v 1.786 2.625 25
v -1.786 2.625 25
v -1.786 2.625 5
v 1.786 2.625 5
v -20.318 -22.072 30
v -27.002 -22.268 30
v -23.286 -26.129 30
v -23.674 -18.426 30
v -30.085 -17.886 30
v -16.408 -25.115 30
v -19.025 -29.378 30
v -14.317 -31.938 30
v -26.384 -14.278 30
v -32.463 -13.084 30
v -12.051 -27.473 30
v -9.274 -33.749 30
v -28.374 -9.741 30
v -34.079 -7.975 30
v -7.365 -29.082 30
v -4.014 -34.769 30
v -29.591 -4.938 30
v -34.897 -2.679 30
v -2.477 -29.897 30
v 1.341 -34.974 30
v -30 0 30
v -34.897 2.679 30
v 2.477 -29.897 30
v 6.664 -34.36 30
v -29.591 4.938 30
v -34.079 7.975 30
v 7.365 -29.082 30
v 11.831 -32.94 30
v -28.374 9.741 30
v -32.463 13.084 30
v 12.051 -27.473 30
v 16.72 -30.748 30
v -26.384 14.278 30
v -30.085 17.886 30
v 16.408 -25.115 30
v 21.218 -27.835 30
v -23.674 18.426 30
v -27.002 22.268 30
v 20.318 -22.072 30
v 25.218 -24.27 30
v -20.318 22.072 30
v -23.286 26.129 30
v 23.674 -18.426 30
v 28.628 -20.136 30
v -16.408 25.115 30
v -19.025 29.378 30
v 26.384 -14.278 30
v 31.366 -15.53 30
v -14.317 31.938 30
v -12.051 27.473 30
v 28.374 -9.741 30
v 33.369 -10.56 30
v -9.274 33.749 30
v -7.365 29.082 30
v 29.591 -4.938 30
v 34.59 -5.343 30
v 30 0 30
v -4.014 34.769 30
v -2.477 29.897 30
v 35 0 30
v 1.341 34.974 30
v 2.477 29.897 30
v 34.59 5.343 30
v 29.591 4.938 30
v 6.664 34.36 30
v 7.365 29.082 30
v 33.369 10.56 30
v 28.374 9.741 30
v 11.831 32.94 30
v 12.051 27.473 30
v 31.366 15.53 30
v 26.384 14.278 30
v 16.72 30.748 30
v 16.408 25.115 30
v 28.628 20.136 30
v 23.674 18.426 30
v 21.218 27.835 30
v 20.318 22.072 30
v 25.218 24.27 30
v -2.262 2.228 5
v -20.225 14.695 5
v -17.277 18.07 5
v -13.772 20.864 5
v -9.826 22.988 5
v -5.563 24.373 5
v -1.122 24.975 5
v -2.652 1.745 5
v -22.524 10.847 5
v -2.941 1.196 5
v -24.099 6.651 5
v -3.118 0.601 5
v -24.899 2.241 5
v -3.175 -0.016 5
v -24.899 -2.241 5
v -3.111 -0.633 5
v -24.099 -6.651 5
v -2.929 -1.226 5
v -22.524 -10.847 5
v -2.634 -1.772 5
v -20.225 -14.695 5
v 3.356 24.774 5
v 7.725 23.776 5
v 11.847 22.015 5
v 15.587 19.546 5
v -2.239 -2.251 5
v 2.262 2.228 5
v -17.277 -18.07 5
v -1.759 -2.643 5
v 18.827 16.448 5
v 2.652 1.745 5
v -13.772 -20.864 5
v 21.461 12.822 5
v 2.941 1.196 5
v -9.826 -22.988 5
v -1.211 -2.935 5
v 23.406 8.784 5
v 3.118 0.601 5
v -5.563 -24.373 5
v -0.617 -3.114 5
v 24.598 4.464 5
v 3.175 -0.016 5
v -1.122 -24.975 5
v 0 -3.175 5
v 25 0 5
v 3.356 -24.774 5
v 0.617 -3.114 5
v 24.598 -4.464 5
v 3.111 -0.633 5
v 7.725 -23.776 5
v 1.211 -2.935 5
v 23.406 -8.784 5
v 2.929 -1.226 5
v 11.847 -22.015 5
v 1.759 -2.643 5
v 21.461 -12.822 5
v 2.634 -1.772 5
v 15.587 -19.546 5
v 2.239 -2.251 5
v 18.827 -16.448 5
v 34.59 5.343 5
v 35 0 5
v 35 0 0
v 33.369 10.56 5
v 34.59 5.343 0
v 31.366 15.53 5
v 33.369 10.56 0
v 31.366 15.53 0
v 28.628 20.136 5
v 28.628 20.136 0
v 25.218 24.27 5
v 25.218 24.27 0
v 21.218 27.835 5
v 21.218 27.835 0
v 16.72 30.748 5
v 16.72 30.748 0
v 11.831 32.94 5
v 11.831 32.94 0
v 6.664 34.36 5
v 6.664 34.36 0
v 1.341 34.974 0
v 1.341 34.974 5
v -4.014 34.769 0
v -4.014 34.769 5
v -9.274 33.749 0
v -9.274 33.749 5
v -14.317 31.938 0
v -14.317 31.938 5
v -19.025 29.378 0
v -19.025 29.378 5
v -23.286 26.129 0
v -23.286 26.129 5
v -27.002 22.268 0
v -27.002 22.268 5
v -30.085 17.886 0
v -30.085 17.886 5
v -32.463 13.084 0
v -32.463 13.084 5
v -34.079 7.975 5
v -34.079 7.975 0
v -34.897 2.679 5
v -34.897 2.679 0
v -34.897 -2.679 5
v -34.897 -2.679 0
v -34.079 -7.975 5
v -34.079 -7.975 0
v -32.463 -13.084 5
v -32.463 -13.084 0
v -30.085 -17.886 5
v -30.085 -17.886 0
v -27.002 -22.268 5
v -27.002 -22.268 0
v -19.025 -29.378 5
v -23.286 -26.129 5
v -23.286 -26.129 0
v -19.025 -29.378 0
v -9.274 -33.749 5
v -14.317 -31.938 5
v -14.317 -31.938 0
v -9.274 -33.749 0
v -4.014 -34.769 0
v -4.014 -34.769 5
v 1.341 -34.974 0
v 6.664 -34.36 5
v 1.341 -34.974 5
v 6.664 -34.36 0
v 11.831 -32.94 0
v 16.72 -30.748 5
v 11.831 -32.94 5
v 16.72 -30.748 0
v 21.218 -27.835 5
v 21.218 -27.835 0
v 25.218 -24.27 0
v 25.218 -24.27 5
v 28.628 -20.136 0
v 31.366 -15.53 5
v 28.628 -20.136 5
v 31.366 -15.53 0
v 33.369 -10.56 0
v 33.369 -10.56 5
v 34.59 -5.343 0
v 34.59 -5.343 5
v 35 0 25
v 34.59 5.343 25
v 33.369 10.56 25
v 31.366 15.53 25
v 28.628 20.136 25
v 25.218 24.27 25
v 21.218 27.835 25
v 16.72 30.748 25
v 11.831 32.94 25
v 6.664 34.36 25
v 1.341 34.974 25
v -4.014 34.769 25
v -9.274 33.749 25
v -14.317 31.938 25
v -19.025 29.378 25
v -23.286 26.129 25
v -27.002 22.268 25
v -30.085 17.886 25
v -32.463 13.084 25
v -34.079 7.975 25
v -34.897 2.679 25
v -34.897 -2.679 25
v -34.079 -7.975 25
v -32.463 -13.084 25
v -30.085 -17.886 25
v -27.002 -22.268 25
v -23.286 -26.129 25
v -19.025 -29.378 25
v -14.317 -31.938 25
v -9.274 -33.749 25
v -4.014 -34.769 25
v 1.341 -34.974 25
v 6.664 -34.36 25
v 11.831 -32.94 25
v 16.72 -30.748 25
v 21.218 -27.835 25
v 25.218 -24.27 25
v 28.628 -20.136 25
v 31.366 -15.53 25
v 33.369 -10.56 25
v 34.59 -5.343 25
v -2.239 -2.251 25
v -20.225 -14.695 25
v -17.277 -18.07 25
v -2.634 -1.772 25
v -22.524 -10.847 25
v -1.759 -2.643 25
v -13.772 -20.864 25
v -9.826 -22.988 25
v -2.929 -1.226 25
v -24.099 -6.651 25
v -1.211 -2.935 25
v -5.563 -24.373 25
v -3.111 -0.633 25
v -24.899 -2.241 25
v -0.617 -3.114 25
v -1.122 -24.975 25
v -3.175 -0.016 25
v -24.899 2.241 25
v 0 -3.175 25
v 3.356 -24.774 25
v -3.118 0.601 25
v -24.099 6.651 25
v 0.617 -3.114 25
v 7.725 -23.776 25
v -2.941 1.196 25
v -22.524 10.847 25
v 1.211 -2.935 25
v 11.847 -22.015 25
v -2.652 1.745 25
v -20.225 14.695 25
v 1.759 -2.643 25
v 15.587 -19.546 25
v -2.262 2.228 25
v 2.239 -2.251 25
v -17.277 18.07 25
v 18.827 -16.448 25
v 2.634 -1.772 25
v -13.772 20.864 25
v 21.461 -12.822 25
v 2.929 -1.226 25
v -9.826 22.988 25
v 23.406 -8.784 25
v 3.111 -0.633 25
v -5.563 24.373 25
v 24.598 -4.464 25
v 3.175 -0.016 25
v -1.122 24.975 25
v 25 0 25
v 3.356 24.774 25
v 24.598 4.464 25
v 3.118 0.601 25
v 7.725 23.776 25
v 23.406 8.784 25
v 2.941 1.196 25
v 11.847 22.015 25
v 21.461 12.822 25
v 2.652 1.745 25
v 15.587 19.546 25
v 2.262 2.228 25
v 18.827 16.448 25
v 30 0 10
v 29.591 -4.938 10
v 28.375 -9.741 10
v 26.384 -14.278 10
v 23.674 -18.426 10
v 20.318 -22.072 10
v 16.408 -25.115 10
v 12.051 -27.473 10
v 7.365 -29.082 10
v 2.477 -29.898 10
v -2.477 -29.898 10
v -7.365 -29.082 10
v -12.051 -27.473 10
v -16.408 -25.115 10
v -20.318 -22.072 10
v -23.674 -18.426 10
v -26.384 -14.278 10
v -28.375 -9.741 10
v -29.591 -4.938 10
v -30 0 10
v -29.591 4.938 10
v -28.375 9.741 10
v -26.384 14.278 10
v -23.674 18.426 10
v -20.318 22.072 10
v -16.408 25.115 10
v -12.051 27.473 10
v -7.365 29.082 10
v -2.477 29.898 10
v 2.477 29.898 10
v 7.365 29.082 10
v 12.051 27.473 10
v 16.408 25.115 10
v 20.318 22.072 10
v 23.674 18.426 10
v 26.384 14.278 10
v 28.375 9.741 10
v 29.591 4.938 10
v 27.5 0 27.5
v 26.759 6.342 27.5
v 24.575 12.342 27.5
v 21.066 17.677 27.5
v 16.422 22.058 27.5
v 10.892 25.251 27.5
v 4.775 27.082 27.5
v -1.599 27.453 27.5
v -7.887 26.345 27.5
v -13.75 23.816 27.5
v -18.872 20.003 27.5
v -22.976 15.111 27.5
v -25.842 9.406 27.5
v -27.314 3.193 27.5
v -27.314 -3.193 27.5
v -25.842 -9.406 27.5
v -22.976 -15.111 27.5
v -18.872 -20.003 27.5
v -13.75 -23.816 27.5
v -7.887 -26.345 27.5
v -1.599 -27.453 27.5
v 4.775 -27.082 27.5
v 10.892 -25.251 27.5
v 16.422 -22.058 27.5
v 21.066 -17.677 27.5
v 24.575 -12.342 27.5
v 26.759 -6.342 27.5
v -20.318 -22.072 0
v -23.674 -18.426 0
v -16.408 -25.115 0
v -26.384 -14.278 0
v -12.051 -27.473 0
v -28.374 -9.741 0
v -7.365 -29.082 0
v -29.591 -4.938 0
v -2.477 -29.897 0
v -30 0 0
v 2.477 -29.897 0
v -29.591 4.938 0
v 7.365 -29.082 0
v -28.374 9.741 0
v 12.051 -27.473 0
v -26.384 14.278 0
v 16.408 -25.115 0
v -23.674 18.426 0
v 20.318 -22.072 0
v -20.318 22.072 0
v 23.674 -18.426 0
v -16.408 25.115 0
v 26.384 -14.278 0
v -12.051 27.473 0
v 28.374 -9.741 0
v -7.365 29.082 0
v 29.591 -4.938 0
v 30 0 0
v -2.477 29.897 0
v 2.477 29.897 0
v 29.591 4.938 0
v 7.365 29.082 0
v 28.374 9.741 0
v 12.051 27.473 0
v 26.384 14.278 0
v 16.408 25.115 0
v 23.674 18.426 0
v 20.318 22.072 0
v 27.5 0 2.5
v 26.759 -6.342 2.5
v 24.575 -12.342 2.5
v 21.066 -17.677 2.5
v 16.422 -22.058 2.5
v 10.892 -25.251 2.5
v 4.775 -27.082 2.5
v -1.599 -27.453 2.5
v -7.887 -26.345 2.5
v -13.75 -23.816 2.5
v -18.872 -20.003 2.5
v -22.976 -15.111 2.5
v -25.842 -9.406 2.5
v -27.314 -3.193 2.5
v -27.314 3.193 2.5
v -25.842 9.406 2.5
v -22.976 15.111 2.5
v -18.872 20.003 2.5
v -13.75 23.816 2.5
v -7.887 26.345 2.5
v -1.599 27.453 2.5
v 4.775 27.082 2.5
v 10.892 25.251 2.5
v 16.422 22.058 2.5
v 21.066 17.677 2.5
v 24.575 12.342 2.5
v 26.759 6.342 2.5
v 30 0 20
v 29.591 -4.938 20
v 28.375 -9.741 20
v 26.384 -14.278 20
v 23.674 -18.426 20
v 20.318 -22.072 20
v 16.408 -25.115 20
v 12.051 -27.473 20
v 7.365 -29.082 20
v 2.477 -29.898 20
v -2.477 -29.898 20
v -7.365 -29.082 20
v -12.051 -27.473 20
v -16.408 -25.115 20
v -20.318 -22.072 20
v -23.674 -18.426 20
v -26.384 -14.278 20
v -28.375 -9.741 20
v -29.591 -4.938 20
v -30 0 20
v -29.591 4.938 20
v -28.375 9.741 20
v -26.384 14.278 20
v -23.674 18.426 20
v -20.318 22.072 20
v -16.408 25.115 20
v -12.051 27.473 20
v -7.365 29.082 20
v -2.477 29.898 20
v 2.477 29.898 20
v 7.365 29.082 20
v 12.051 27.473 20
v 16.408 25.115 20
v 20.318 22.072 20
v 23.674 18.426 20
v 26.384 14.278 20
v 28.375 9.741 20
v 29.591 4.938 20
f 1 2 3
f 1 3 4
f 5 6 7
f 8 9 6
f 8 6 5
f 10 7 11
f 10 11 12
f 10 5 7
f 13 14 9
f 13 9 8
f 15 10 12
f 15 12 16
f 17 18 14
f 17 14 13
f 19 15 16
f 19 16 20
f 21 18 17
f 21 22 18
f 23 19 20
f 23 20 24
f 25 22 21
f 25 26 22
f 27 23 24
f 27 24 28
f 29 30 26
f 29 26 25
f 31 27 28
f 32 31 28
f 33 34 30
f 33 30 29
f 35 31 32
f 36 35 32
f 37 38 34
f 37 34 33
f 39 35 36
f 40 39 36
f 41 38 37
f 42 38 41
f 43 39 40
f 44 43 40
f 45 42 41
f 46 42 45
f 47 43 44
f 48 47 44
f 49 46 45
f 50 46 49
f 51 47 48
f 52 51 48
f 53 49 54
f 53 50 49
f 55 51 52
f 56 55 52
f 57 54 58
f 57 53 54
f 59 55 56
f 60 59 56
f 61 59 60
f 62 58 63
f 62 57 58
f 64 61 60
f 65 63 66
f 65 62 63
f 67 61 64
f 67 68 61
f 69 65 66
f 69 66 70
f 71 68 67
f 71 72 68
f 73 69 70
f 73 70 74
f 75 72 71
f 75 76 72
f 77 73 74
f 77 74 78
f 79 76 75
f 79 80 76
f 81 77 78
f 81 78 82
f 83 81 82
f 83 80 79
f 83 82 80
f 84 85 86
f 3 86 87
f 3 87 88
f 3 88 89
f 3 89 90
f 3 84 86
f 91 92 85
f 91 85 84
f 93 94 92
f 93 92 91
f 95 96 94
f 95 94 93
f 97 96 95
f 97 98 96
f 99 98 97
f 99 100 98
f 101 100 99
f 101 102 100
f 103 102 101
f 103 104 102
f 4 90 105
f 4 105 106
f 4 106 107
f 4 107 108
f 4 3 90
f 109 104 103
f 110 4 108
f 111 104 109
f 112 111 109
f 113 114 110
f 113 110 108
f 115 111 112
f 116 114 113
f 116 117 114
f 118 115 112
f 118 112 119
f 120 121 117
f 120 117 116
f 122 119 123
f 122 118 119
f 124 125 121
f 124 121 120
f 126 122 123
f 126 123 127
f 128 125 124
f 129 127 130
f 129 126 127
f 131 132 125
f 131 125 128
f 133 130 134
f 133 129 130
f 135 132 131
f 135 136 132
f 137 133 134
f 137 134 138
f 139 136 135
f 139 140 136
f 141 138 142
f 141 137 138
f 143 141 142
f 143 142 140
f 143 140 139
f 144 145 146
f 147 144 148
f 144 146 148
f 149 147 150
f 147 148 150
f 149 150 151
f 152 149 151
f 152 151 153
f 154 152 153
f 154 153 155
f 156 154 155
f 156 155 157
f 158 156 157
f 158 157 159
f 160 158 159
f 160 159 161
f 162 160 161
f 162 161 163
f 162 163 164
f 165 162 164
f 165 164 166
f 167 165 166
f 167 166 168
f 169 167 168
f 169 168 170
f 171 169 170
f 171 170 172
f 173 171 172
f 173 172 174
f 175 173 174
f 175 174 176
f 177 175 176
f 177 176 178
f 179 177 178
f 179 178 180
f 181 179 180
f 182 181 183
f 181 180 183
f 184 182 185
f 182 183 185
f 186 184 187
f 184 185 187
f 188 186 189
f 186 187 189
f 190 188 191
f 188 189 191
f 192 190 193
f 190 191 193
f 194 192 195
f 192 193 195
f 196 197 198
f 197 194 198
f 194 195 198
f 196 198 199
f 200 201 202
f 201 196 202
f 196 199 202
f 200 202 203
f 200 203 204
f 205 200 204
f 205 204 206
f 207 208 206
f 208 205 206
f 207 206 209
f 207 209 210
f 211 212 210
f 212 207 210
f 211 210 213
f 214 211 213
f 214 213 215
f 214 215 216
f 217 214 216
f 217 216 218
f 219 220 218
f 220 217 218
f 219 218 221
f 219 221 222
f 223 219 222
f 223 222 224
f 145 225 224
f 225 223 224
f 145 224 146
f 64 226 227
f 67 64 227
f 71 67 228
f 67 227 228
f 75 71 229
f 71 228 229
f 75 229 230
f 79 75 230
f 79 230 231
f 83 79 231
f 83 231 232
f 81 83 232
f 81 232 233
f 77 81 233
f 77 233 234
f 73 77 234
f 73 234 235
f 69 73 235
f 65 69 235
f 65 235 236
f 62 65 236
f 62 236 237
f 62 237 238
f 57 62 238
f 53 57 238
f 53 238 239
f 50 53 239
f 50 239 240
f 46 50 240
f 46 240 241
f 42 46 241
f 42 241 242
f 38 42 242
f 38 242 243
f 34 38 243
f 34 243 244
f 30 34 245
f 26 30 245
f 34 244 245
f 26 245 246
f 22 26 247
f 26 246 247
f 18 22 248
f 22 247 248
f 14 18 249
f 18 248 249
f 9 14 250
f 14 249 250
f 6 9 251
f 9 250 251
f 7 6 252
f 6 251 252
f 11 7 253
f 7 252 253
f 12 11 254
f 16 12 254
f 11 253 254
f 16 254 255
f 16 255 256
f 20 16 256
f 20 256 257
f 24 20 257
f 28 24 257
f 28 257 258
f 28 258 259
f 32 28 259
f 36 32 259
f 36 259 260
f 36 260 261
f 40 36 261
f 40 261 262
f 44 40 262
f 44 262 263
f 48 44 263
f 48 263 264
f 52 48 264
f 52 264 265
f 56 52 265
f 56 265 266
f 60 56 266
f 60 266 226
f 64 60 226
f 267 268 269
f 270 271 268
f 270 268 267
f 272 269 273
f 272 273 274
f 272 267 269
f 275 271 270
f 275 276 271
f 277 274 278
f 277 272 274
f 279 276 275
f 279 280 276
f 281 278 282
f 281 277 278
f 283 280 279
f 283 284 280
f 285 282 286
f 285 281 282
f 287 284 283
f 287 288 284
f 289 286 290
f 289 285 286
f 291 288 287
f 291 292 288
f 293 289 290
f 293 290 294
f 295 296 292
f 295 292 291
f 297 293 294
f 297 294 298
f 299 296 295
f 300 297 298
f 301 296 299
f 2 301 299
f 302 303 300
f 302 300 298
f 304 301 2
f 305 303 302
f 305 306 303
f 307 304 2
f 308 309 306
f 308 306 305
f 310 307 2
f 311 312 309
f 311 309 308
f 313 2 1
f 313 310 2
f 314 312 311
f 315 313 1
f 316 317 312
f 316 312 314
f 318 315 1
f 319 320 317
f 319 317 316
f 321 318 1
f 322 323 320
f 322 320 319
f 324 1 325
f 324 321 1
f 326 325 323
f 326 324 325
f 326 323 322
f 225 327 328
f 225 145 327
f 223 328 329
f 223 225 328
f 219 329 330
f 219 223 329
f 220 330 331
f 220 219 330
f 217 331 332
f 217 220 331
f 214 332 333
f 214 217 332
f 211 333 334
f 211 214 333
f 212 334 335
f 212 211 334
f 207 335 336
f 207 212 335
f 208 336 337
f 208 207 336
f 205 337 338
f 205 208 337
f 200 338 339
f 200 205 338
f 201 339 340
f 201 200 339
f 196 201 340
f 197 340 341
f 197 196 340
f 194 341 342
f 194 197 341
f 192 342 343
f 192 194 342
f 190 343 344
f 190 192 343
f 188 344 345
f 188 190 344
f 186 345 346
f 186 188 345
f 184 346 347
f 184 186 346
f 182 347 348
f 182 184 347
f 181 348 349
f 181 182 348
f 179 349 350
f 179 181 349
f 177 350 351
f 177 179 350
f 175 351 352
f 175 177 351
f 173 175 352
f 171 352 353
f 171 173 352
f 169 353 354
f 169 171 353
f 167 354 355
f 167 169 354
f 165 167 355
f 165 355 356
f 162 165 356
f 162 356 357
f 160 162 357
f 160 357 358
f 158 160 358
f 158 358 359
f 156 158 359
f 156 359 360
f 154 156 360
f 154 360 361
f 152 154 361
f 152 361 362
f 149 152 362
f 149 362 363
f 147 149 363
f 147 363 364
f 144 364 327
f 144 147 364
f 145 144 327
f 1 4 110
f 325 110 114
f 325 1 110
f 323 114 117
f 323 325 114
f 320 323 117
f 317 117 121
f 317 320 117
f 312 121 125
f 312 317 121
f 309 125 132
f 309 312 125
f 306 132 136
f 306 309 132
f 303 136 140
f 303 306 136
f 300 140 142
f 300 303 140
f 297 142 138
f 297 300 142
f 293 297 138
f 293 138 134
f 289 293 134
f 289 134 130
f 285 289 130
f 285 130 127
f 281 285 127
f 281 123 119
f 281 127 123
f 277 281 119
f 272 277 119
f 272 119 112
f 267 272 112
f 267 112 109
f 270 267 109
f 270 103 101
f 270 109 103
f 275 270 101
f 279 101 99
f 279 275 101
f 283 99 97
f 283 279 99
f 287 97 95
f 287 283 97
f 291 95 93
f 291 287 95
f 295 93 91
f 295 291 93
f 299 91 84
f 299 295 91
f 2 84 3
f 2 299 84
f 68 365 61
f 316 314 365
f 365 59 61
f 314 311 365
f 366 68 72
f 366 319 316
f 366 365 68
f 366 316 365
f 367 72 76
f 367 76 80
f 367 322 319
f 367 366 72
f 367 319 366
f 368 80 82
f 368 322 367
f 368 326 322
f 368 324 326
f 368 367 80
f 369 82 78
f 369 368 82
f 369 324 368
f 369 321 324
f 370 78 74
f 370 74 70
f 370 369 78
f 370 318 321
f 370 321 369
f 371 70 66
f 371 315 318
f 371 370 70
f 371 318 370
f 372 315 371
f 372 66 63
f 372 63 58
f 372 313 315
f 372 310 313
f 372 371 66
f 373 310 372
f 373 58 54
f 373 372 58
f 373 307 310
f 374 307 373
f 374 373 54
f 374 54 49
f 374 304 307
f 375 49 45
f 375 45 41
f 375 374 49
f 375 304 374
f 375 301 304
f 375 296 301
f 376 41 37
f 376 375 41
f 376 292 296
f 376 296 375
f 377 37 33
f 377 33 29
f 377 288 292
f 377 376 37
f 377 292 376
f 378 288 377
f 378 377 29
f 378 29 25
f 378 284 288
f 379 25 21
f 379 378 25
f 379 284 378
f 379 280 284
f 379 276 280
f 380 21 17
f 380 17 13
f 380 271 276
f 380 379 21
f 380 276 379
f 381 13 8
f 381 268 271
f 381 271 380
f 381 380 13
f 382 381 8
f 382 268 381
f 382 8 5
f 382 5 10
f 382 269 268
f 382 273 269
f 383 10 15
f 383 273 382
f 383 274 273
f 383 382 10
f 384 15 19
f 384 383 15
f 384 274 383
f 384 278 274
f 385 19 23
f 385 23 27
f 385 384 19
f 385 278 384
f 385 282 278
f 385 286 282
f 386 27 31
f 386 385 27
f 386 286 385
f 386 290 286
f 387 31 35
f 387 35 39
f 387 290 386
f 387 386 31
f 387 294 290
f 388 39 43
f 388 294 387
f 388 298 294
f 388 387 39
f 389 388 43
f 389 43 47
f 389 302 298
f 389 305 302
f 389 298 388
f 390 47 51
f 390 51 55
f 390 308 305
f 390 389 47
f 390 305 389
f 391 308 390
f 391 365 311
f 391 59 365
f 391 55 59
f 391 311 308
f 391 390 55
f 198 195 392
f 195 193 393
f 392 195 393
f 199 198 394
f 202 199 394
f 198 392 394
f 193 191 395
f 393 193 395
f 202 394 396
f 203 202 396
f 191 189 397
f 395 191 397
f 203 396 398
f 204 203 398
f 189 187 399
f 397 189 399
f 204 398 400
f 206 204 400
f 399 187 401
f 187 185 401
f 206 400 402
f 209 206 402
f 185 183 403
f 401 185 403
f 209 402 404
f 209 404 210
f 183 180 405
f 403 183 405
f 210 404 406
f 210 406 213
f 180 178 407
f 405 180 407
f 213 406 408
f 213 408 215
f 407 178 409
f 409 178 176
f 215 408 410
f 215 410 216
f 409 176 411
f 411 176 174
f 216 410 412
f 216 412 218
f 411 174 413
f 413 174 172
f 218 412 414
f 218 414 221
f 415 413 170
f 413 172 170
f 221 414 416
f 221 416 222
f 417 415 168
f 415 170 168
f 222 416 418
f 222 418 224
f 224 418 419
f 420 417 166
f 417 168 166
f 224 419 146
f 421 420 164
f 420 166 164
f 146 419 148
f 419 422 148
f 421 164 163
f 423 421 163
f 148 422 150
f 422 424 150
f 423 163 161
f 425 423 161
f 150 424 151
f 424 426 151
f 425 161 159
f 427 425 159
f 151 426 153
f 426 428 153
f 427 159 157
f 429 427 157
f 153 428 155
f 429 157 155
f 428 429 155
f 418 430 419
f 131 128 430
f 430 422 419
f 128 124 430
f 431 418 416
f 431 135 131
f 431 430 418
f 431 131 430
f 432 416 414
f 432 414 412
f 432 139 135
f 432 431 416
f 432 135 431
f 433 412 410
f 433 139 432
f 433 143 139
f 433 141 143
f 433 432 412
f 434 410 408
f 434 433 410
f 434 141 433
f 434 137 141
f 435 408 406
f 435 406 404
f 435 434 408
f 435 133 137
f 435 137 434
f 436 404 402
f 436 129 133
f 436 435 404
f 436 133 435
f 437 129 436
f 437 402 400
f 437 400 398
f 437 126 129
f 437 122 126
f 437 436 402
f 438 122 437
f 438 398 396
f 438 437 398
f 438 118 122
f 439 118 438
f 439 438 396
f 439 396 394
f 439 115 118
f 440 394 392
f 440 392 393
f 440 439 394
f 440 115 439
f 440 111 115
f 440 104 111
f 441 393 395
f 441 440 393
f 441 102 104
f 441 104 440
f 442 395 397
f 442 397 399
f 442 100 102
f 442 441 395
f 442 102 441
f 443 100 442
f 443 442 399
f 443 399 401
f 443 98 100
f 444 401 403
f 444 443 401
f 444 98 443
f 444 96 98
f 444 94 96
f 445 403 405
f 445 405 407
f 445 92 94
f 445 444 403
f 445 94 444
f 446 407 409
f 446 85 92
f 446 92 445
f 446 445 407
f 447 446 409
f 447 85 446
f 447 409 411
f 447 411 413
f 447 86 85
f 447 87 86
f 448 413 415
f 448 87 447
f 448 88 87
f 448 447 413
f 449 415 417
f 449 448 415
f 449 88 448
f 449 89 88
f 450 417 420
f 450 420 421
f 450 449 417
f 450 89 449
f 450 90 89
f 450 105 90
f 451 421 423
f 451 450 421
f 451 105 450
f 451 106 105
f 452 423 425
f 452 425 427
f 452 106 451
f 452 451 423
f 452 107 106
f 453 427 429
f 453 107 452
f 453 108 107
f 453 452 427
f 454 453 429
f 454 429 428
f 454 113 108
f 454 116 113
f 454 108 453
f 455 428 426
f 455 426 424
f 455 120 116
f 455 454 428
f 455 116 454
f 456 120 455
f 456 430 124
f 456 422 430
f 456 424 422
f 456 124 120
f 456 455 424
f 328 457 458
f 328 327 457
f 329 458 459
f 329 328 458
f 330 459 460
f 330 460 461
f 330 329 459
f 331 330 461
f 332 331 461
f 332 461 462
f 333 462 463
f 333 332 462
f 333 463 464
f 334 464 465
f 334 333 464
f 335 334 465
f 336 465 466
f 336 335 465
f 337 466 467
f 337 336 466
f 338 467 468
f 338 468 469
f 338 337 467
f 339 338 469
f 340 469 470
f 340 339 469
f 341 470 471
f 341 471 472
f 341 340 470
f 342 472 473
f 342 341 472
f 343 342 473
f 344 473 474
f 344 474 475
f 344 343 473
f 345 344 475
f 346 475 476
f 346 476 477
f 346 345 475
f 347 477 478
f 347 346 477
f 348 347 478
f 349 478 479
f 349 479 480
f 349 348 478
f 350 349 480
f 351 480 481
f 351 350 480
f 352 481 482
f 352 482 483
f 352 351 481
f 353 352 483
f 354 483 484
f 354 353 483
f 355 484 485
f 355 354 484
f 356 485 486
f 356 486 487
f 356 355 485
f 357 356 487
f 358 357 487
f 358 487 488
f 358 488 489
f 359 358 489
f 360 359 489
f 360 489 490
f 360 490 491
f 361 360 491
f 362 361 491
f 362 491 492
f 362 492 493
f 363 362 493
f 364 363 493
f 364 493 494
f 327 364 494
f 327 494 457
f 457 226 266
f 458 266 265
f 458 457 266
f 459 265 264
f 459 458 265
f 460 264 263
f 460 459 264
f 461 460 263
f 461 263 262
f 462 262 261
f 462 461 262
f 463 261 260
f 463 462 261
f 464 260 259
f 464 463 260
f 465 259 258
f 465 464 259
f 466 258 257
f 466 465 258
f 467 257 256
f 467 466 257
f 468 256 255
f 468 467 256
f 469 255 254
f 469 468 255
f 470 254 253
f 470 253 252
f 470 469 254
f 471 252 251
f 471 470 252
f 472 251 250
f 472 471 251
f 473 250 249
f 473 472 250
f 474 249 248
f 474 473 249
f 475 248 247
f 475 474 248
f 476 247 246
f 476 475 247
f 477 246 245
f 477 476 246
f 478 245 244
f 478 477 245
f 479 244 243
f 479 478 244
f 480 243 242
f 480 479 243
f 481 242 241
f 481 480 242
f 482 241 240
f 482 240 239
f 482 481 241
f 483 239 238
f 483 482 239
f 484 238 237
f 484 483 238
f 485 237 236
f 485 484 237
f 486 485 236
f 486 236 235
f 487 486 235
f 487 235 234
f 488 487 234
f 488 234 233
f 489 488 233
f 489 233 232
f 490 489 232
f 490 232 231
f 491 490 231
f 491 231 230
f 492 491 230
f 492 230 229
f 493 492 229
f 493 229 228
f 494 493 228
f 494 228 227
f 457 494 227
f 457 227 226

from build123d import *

# Parameters (mm, degrees)
SKETCH1_R           = 35
BOSS_EXTRUDE1_DEPTH = 30
SKETCH3_R           = 25
CUT_EXTRUDE1_DEPTH  = 5
CUT_EXTRUDE2_START  = -5
SKETCH4_R           = 25
CUT_EXTRUDE2_DEPTH  = 5
CUT_EXTRUDE3_DEPTH  = 39
CHAMFER2_SIZE       = 5


with BuildPart() as part:
    # Sketch1 → Boss-Extrude1 (new body)
    with BuildSketch(Plane.XY):
        Circle(SKETCH1_R)
    extrude(amount=BOSS_EXTRUDE1_DEPTH)

    # Sketch3 → Cut-Extrude1 (cut)
    with BuildSketch(Plane.XY.offset(30)):
        Circle(SKETCH3_R)
    extrude(amount=-CUT_EXTRUDE1_DEPTH, mode=Mode.SUBTRACT)

    # Sketch4 → Cut-Extrude2 (cut)
    with BuildSketch(Plane(origin=(0, 0, 0), x_dir=(-1, 0, 0), z_dir=(0, 0, -1)).offset(CUT_EXTRUDE2_START)):
        with Locations(Location((0, 0, 0), (0, 0, 180))):
            Circle(SKETCH4_R)
    extrude(amount=CUT_EXTRUDE2_DEPTH, mode=Mode.SUBTRACT)

    # Sketch5 → Cut-Revolve1 (revolve, cut)
    with BuildSketch(Plane(origin=(0, 0, 0), x_dir=(0, 0, -1), z_dir=(1, 0, 0)), mode=Mode.PRIVATE) as cut_revolve1_sk:
        Polygon((-25, 35), (-20, 30), (-10, 30), (-5, 35), align=None)
    revolve(cut_revolve1_sk.sketch.rotate(Axis((0, 0, 49.767686579), (0, 0, -1)), 90), axis=Axis((0, 0, 49.767686579), (0, 0, -1)), mode=Mode.SUBTRACT)

    # Sketch6 → Cut-Extrude3 (cut)
    with BuildSketch(Plane.XY.offset(25)):
        with BuildLine():
            Line((-1.78605711, 2.625), (1.78605711, 2.625))
            ThreePointArc((1.78605711, 2.625), (0, -3.175), (-1.78605711, 2.625))
        make_face()
    extrude(amount=-CUT_EXTRUDE3_DEPTH, mode=Mode.SUBTRACT)

    # Chamfer2
    chamfer2_edges = [part.edges().sort_by_distance(p)[0] for p in [
        (-25, 0, 0),
        (-25, 0, 30),
    ]]
    chamfer(chamfer2_edges, length=CHAMFER2_SIZE - 0.0001)  # a hair under: the kernel refuses the full size


solid = part.part
